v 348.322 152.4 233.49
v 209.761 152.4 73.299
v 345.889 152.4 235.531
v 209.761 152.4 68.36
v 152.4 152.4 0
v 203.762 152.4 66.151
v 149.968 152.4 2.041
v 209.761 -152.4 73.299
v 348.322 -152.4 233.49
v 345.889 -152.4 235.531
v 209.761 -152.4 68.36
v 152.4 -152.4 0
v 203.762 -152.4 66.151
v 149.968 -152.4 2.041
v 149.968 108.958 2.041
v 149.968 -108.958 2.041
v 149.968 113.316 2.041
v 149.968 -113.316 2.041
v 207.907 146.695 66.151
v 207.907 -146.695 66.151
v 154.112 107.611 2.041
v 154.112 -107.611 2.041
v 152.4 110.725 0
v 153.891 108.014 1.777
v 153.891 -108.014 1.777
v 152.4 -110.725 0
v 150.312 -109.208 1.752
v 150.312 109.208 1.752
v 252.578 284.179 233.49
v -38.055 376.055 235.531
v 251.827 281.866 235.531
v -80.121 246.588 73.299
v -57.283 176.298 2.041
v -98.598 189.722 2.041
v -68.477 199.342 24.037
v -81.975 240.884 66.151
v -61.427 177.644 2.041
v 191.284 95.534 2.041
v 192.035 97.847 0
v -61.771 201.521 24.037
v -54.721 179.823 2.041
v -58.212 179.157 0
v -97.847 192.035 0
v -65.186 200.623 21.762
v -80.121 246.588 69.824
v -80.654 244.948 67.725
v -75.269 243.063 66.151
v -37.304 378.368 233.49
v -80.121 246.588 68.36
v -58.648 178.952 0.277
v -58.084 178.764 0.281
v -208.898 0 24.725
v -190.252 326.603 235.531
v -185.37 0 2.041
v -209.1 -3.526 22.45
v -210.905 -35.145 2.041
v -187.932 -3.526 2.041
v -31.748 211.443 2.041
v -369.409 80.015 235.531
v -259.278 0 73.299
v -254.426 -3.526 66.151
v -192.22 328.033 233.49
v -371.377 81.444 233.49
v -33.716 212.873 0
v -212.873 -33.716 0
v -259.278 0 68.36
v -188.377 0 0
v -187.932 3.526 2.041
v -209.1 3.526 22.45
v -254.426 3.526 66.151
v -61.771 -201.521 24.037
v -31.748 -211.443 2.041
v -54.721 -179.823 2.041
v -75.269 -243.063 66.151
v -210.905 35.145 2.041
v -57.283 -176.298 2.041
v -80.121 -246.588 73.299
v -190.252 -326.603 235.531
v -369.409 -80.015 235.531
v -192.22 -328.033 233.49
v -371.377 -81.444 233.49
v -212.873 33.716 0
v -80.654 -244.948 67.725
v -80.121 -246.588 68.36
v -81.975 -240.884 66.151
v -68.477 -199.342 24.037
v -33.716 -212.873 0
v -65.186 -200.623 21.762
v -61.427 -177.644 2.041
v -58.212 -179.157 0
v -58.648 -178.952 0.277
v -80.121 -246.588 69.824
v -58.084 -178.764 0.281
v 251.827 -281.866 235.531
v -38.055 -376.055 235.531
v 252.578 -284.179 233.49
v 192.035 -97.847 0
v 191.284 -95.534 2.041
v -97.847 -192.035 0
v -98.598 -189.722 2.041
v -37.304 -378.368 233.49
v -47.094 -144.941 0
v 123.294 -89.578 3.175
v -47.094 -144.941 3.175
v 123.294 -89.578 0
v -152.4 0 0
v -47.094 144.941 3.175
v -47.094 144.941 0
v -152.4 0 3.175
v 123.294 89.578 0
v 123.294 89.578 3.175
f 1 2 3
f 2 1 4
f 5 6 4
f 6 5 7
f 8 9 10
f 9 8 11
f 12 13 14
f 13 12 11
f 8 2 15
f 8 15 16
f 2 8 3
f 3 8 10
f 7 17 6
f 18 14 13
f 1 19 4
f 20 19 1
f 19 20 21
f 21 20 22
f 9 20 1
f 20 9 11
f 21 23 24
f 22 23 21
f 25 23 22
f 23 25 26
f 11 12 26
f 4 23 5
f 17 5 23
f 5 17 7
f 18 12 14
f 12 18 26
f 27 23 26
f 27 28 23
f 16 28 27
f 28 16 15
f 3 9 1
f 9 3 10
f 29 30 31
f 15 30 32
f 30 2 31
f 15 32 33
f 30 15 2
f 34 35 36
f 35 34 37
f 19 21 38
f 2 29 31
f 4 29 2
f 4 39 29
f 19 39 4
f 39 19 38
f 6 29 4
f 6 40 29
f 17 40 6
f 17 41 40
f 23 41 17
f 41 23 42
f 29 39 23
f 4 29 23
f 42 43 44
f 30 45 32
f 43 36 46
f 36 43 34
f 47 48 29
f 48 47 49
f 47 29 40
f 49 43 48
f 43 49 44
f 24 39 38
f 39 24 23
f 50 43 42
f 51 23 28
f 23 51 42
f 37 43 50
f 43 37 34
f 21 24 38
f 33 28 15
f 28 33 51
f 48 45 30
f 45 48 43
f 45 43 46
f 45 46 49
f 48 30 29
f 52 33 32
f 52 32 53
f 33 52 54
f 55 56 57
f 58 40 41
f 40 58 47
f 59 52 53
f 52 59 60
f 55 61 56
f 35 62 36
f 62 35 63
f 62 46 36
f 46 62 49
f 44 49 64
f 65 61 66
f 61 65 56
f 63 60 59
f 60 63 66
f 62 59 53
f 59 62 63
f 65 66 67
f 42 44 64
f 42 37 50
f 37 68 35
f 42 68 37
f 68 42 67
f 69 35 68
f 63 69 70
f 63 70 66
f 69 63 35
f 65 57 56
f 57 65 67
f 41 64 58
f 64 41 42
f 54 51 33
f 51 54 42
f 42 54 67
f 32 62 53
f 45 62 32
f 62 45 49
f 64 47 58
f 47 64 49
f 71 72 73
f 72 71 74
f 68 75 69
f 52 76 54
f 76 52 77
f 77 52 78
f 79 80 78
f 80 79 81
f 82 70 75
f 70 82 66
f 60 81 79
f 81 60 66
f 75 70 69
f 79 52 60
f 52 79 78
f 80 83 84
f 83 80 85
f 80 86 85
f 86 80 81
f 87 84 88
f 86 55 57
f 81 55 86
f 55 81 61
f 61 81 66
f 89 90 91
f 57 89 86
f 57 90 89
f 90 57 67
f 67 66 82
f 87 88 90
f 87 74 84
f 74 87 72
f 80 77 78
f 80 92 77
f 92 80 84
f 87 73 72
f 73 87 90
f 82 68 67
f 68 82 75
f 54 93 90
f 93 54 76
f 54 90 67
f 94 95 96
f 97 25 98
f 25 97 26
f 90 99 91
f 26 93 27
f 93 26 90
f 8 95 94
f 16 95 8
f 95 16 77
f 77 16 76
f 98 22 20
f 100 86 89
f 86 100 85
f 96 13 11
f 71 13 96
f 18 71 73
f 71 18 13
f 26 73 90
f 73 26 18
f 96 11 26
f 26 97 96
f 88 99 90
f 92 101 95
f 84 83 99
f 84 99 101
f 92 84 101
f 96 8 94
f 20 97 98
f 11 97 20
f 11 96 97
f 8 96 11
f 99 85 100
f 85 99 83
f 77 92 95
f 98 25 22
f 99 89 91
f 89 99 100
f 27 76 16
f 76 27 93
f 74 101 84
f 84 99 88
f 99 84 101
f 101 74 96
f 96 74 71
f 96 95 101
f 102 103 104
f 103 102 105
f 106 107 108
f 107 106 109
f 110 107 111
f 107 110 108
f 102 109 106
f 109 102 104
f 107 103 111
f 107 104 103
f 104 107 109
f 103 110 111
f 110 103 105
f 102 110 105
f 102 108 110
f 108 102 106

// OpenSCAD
module onebyfour(length){
    cube([3.5,length,.75], center=true);
}

module sheet(){
//    25.75
}


module base(){
    for(X=[-1,1]) translate([(6-1.75)*X,0,0]) onebyfour(96);
    for(Y=[-1,1]) translate([0,(48-1.75)*Y,0]) rotate([0,0,90]) color("orange") onebyfour(12-7);

    for(X=[-1,1]) translate([(6-(.75/2))*X,0,1.75+(.75/2)]) rotate([0,90,0]) onebyfour(96);
    for(Y=[-1,1]) translate([0,(48-(.75/2))*Y,1.75+(.75/2)]) rotate([0,90,90]) color("orange") onebyfour(12-1.5);
}

module legs(){
    translate([0,0,36/2]) for(X=[-1,1], Y=[-1,0,1]) translate([(6+(.75/2))*X,(48-(3.5/2)+.75)*Y,0]) rotate([90,0,90]) onebyfour(36);
    translate([0,0,36/2]) for(X=[-1,1], Y=[-1,1]) translate([(6-1.75)*X,(48+(.75/2))*Y,0]) rotate([90,0,0]) onebyfour(36);
}


//legs();
//translate([0,0,22.7]) base();
//
//translate([0,0,36]) for(X=[-1,1]) translate([(6+1.75)*X,0,0]) onebyfour(96);
//translate([0,-48,36-(25.75/2)]) cube([1,96,(25.75/2)]);

module firepit(sides=3, base=12, top=30){
  rotate([0,0,(360/(sides*2))]){
    cylinder(d=(25.4*base), h=(25.4*0.125), $fn=sides);
    %cylinder(d1=(25.4*base), d2=(25.4*top), h=(25.4*10), $fn=sides);
  }
    for(R=[0:(360/sides):360])
      rotate([0,0,-90+R]) translate([-(25.4*(12/2)),(25.4*(12/2)),0]) rotate([50,0,0]) cube([(25.4*base), (25.4*base), (25.4*0.125)]);
}
// 3::120 4::90  5::72  6::60
firepit(sides=5, base=12);
